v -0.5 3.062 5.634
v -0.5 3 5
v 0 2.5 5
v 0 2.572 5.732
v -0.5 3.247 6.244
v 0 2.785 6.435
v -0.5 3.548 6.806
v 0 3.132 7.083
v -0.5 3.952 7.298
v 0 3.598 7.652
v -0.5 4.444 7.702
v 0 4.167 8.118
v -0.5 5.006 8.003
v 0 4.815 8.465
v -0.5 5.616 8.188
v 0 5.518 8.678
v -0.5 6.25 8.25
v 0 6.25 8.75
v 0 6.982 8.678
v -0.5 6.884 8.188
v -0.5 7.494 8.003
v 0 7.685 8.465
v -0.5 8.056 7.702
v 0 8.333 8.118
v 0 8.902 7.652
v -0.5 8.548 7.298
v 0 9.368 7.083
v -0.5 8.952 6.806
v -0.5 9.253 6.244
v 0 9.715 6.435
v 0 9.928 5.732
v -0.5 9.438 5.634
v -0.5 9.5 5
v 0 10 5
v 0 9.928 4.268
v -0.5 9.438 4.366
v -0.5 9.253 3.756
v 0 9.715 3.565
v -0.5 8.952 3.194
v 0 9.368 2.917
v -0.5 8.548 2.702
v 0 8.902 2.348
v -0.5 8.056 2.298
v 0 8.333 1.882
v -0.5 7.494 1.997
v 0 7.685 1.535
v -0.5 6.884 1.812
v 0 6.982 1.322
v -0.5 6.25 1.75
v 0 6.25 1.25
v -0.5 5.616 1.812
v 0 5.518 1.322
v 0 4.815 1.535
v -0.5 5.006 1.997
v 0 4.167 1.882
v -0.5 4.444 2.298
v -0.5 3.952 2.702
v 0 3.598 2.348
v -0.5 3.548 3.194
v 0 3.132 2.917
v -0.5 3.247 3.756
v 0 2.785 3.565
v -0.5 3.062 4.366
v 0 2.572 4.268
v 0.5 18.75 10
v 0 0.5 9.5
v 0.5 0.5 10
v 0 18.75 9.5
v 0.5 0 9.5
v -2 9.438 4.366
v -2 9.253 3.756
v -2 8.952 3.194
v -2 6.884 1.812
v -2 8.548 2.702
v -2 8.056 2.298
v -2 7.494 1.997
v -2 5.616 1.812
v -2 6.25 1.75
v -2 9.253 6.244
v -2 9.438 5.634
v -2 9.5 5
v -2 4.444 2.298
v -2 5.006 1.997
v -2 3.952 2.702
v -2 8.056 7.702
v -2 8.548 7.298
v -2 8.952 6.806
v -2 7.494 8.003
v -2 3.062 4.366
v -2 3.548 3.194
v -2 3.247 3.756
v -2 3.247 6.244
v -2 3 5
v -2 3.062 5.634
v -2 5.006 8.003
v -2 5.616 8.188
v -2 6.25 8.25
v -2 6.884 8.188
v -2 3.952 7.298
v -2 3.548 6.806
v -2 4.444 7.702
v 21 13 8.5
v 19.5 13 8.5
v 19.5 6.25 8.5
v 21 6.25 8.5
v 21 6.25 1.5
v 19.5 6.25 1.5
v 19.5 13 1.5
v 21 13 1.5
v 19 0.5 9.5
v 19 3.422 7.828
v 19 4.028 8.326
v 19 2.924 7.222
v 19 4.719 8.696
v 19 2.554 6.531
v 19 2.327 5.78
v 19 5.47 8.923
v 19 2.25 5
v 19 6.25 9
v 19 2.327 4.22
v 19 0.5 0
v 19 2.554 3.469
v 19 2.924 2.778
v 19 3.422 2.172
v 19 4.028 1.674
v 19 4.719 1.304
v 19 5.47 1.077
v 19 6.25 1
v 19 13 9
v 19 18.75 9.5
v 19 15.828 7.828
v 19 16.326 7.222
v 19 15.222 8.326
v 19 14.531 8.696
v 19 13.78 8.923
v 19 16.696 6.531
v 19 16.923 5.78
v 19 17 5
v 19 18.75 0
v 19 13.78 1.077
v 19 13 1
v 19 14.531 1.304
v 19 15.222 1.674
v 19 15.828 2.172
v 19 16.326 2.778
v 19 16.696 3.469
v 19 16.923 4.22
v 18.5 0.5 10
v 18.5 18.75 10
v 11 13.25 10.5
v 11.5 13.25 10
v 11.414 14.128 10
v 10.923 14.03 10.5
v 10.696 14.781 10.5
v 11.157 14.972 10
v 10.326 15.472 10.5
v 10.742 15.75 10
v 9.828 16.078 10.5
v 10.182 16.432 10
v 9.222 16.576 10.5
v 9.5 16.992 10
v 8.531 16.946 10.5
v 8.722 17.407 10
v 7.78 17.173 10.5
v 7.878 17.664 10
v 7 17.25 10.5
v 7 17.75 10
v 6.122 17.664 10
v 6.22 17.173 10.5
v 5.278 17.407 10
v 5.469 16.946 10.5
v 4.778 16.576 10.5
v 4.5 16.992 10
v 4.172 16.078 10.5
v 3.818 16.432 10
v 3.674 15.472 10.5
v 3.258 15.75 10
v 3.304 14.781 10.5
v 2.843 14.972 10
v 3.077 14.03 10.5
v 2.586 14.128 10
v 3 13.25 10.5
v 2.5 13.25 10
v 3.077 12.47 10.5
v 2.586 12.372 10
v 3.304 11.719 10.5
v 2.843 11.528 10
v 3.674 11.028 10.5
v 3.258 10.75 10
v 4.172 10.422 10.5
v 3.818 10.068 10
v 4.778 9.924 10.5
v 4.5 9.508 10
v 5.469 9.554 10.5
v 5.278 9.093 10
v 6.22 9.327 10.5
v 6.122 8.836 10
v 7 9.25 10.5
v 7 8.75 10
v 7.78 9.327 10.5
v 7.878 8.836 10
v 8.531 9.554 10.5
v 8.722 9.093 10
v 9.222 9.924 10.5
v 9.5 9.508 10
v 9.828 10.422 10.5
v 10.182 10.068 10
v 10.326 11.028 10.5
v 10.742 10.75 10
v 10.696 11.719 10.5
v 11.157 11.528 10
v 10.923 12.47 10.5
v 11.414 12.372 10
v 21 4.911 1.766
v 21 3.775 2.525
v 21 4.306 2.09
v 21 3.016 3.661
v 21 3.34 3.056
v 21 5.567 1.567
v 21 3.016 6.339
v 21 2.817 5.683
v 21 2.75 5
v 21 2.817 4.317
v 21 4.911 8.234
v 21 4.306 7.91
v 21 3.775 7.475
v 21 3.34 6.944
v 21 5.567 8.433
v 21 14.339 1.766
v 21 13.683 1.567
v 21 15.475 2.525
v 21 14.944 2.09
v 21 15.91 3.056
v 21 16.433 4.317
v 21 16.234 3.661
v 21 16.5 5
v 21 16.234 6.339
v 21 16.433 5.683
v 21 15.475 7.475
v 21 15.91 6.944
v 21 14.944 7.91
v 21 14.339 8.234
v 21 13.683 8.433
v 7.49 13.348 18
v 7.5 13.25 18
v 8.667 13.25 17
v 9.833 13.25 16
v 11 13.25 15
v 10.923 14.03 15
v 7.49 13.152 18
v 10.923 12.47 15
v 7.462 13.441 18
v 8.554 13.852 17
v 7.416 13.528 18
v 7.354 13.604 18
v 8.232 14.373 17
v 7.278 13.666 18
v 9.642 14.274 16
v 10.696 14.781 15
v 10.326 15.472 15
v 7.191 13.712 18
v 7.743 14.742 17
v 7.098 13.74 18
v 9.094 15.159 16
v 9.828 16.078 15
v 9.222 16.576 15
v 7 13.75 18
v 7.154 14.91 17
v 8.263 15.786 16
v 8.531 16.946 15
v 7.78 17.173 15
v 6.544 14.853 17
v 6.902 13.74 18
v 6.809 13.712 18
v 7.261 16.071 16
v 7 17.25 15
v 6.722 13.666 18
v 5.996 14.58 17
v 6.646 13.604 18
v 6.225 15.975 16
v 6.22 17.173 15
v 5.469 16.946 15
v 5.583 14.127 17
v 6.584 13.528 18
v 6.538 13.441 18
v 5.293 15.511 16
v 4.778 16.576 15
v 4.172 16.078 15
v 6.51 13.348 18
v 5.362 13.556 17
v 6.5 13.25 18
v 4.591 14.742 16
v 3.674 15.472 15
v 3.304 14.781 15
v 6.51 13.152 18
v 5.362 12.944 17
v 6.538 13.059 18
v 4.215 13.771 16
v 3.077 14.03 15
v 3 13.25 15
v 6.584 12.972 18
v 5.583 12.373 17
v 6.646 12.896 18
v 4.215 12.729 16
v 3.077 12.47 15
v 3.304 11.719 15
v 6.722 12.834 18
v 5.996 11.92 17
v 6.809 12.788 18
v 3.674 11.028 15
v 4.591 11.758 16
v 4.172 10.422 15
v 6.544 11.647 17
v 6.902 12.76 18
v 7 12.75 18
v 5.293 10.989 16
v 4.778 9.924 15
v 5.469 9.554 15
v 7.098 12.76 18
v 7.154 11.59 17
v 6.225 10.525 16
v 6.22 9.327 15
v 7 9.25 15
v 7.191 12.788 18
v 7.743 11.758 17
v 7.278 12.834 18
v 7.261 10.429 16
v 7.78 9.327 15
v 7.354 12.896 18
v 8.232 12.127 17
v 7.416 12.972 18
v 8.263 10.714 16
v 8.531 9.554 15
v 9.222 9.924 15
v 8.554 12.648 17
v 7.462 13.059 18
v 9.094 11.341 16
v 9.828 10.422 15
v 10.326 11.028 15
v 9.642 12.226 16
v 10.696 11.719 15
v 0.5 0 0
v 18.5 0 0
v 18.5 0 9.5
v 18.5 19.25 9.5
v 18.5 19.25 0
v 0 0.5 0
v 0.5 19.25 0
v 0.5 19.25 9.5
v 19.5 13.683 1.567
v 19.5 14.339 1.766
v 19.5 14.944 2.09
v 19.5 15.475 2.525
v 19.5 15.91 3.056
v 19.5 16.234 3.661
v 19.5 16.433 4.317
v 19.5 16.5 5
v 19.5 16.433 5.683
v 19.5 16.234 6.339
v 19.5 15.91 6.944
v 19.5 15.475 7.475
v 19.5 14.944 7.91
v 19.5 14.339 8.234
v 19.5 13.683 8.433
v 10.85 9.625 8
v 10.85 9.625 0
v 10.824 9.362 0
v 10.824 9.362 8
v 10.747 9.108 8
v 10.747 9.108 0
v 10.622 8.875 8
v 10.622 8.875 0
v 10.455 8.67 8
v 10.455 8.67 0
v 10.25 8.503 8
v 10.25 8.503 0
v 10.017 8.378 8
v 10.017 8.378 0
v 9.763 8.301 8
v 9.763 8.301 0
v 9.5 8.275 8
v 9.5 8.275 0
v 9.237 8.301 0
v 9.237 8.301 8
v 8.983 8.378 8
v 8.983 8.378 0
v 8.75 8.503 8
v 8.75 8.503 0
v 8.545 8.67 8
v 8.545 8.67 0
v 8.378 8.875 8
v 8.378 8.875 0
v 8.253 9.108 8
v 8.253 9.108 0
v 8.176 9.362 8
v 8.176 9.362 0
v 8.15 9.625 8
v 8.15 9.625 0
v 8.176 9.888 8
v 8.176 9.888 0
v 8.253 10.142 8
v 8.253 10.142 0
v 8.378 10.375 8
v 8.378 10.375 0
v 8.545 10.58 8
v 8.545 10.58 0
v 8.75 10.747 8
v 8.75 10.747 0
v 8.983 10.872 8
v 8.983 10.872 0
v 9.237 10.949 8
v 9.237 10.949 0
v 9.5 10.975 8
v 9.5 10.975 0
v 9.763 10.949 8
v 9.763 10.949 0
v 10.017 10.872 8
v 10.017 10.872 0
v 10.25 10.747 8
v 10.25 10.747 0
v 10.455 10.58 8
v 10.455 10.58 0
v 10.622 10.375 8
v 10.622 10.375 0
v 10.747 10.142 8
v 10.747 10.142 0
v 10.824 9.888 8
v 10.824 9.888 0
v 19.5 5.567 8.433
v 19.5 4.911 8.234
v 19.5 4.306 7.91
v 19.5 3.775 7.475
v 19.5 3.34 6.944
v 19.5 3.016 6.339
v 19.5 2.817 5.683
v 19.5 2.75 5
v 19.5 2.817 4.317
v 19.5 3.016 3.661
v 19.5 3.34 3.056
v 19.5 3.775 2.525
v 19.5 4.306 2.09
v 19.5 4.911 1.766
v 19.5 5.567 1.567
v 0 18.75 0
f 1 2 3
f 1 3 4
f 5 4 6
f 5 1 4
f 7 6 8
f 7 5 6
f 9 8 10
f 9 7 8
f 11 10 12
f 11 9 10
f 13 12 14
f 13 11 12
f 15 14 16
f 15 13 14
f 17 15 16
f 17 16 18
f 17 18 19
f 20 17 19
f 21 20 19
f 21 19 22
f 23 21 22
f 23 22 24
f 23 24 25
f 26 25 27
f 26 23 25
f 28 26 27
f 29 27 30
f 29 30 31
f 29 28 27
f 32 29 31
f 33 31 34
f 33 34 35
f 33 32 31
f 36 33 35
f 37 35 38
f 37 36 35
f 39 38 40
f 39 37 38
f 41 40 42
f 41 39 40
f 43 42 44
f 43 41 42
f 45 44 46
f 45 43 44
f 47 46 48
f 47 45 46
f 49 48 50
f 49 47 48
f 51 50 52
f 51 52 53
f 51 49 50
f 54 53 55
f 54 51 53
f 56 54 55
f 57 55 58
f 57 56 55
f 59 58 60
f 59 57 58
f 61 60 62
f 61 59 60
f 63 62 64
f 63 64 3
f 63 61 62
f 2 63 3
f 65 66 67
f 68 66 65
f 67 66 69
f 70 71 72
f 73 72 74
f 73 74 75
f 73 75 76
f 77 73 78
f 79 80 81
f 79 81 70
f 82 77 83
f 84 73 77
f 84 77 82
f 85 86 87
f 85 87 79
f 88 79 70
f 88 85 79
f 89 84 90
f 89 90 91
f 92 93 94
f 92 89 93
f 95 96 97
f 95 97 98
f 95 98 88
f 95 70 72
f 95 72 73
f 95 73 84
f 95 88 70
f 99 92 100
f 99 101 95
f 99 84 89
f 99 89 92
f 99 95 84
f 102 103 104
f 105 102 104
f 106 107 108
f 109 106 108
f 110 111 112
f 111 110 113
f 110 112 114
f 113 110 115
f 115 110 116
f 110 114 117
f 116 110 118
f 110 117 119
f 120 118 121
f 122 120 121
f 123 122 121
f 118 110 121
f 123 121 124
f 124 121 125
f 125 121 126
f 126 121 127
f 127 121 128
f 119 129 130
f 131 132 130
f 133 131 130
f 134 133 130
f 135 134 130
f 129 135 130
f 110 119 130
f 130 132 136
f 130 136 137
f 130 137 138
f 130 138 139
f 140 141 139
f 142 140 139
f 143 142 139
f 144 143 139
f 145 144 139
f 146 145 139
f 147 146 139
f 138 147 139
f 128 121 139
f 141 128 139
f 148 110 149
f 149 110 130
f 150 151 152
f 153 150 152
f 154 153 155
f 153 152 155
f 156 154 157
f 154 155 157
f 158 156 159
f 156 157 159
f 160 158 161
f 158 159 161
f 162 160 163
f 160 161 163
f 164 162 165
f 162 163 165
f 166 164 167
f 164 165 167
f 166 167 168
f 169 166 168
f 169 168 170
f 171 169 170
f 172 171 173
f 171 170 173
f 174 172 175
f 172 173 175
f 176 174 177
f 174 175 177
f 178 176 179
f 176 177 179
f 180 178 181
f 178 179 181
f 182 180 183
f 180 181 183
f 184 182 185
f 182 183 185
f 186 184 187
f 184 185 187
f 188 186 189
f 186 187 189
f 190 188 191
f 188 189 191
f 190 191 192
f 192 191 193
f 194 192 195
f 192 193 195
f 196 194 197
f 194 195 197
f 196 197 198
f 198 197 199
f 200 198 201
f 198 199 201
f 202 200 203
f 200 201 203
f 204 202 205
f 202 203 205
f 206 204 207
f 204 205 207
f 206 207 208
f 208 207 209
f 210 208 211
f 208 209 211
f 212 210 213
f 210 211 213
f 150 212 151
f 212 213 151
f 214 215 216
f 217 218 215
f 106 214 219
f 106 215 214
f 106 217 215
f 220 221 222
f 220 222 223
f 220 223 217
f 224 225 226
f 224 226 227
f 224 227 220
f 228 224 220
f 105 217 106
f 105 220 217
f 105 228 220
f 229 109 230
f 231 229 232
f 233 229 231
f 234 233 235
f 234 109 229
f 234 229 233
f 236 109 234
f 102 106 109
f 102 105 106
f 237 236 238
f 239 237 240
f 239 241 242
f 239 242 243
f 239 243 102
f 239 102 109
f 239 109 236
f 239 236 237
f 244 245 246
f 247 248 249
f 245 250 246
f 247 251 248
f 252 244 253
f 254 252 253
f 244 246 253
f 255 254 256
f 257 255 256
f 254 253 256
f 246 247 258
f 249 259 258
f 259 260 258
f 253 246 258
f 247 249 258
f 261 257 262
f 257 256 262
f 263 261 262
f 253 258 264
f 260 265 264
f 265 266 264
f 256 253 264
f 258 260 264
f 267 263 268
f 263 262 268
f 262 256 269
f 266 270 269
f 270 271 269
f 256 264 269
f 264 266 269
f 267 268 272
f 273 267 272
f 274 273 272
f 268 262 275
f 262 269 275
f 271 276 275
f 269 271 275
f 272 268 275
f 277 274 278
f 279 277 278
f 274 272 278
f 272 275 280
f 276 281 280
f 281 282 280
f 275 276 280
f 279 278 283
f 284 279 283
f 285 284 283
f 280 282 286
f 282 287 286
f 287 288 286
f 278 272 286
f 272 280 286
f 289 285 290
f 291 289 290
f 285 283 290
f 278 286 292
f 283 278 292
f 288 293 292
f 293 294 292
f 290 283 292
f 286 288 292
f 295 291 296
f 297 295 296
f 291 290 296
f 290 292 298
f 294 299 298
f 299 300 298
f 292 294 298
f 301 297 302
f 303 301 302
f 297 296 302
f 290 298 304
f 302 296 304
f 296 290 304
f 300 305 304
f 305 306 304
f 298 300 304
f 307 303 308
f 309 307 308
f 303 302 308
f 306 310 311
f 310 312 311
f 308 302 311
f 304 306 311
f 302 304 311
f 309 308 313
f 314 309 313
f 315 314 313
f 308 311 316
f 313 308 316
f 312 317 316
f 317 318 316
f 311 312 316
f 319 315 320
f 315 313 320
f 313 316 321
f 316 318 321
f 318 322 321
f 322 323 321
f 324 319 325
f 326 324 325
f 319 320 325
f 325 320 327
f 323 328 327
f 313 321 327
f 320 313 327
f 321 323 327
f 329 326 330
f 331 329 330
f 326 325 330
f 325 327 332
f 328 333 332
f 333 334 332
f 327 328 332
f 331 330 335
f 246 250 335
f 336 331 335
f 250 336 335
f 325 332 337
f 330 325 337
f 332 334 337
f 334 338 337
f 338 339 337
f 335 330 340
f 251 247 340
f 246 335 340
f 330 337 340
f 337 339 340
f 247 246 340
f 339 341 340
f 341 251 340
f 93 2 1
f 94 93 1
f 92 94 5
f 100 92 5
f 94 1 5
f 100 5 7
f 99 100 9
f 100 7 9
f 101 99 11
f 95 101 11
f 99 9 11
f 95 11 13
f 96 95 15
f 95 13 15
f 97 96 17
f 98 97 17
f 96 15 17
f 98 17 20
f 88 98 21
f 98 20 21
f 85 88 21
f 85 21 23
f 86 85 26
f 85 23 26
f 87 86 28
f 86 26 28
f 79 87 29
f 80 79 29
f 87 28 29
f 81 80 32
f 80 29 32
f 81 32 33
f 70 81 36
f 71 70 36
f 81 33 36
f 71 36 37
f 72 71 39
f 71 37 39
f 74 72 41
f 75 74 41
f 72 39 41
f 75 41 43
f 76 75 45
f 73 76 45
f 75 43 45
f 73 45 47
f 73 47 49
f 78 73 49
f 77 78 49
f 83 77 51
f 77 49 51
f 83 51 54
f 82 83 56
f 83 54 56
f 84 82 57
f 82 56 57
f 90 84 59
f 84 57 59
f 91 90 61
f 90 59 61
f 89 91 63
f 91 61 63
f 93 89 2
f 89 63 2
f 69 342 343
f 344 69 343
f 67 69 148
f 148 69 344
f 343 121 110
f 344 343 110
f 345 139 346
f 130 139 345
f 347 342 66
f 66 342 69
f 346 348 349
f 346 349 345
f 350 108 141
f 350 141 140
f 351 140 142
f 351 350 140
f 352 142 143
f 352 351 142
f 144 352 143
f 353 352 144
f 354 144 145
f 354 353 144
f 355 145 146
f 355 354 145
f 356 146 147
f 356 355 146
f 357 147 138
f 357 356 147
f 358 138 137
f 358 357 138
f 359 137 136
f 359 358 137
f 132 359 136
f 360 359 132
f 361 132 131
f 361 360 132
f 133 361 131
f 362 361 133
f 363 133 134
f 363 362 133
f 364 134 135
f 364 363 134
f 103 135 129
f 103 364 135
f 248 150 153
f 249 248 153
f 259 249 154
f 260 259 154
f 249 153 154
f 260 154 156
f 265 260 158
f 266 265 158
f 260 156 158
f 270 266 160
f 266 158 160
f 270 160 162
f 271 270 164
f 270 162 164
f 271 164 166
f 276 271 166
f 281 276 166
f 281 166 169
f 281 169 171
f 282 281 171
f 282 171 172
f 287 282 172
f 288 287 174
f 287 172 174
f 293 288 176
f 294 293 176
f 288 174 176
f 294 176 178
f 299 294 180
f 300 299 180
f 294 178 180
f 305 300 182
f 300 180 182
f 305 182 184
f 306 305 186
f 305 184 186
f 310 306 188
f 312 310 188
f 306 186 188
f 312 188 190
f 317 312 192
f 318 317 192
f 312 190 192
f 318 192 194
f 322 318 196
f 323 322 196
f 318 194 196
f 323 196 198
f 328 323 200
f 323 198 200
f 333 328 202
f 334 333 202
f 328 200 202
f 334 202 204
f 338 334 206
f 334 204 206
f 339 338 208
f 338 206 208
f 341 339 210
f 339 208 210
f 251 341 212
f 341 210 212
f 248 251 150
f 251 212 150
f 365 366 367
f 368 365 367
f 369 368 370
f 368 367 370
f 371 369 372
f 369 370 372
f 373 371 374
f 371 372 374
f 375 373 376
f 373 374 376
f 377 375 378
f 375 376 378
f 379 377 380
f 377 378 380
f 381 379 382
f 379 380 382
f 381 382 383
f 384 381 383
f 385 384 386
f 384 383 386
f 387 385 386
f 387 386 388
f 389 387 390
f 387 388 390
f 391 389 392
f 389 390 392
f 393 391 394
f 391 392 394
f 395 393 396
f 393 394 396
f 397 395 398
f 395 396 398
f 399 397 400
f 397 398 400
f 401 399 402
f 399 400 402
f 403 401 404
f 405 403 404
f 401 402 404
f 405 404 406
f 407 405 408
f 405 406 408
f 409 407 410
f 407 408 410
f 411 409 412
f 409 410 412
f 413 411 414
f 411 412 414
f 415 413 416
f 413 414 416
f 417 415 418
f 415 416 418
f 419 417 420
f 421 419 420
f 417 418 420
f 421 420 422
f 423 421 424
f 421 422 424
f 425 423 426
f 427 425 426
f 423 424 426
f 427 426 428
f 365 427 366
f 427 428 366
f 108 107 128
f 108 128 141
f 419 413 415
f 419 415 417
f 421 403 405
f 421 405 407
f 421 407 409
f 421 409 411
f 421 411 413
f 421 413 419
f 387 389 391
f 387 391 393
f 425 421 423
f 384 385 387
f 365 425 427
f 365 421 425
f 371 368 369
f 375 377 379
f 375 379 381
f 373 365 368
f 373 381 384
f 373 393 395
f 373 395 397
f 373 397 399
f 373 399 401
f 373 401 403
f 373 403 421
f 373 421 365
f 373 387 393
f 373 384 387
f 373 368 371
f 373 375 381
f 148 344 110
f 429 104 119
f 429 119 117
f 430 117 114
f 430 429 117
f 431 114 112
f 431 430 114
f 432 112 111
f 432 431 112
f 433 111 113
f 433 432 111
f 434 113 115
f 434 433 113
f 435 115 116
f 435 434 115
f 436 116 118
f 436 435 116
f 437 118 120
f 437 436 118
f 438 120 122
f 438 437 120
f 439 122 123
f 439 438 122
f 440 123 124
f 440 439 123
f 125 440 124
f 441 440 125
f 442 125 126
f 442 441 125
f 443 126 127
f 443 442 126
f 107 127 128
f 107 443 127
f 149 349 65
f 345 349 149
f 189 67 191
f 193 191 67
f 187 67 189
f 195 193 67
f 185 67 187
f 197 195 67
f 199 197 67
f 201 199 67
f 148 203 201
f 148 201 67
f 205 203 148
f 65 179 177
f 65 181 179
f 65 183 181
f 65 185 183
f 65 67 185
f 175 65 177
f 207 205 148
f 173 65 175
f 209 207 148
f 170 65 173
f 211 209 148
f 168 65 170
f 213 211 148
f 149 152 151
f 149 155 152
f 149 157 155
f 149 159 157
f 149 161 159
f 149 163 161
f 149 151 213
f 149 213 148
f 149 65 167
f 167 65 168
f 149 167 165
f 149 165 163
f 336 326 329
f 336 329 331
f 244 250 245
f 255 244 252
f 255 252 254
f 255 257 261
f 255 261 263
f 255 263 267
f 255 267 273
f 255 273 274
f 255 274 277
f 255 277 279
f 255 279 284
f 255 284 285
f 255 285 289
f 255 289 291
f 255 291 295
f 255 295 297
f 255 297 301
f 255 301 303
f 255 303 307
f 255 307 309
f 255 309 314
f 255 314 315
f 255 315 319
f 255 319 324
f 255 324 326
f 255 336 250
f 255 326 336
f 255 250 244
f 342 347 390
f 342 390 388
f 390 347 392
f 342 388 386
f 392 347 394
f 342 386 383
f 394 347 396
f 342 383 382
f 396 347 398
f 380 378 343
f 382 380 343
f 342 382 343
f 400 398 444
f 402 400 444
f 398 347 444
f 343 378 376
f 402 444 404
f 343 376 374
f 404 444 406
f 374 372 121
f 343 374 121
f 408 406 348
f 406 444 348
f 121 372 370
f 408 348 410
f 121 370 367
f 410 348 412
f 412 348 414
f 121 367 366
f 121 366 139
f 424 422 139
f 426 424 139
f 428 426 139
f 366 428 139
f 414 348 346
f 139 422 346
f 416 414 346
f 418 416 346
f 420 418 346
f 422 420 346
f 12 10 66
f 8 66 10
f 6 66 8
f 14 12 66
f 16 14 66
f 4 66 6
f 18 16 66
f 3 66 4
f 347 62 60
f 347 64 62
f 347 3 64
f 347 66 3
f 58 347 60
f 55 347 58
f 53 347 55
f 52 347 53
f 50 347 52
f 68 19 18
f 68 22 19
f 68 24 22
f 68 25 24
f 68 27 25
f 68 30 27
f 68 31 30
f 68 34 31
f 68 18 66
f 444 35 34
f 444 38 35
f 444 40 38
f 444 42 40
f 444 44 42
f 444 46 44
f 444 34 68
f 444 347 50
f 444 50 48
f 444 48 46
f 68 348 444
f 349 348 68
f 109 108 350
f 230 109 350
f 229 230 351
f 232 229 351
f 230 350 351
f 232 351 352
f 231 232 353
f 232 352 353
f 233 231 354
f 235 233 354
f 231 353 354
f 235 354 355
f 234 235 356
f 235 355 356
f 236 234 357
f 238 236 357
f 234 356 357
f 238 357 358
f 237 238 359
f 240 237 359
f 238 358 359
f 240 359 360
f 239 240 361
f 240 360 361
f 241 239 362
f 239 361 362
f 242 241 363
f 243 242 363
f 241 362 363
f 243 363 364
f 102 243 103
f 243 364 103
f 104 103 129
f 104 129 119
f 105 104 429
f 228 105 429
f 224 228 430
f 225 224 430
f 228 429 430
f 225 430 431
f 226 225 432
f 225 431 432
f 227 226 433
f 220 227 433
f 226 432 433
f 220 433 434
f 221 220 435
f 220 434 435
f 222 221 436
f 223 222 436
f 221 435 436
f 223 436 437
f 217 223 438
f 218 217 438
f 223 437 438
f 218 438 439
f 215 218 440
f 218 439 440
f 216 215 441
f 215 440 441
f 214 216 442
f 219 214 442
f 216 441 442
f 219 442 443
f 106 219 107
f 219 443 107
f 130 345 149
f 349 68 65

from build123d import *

# Parameters (mm, degrees)
F0_W      = 19
F0_H      = 19.25
F1_DEPTH  = 10
F2_R      = 4
F3_DEPTH  = 8
F4_SIZE2  = 3
F4_SIZE   = 3.5
F5_R      = 3.25
F6_DEPTH  = 2
F8_DEPTH  = 2
F9_SIZE   = 0.5
F10_R     = 1.35
F11_DEPTH = 8


with BuildPart() as f1:
    # F0 (on Top) → F1 (new body)
    with BuildSketch(Plane.XY):
        with Locations((9.5, 9.625)):
            Rectangle(F0_W, F0_H)
    extrude(amount=F1_DEPTH)

    # F2 (on face) → F3 (join)
    with BuildSketch(Plane.XY.offset(10)):
        with Locations((7, 13.25)):
            Circle(F2_R)
    extrude(amount=F3_DEPTH)

    # F4
    f4_edges = [f1.edges().sort_by_distance(p)[0] for p in [
        (3, 13.25, 18),
    ]]
    f4_side = f1.faces().sort_by_distance((7, 13.25, 18))[0]
    chamfer(f4_edges, length=F4_SIZE, length2=F4_SIZE2, reference=f4_side)

    # F5 (on face) → F6 (join)
    with BuildSketch(Plane(origin=(0, 0, 0), x_dir=(0, -1, 0), z_dir=(-1, 0, 0))):
        with Locations((-6.25, 5)):
            Circle(F5_R)
    extrude(amount=F6_DEPTH)

    # F7 (on face) → F8 (join)
    with BuildSketch(Plane.YZ.offset(19)):
        with BuildLine():
            Line((13, 8.5), (6.25, 8.5))
            ThreePointArc((6.25, 8.5), (2.75, 5), (6.25, 1.5))
            Line((6.25, 1.5), (13, 1.5))
            ThreePointArc((13, 1.5), (16.5, 5), (13, 8.5))
        make_face()
    extrude(amount=F8_DEPTH)

    # F9
    f9_edges = [f1.edges().sort_by_distance(p)[0] for p in [
        (19, 19.25, 5),
        (0, 19.25, 5),
        (0, 0, 5),
        (19, 0, 5),
        (0, 9.625, 10),
        (9.5, 19.25, 10),
        (9.5, 0, 10),
        (19, 9.625, 10),
        (3, 13.25, 10),
        (0, 9.5, 5),
        (19, 9.625, 8.5),
    ]]
    chamfer(f9_edges, length=F9_SIZE)

    # F10 (on face) → F11 (cut)
    with BuildSketch(Plane(origin=(0, 0, 0), x_dir=(1, 0, 0), z_dir=(0, 0, -1))):
        with Locations((9.5, -9.625)):
            Circle(F10_R)
    extrude(amount=-F11_DEPTH, mode=Mode.SUBTRACT)


solid = f1.part
